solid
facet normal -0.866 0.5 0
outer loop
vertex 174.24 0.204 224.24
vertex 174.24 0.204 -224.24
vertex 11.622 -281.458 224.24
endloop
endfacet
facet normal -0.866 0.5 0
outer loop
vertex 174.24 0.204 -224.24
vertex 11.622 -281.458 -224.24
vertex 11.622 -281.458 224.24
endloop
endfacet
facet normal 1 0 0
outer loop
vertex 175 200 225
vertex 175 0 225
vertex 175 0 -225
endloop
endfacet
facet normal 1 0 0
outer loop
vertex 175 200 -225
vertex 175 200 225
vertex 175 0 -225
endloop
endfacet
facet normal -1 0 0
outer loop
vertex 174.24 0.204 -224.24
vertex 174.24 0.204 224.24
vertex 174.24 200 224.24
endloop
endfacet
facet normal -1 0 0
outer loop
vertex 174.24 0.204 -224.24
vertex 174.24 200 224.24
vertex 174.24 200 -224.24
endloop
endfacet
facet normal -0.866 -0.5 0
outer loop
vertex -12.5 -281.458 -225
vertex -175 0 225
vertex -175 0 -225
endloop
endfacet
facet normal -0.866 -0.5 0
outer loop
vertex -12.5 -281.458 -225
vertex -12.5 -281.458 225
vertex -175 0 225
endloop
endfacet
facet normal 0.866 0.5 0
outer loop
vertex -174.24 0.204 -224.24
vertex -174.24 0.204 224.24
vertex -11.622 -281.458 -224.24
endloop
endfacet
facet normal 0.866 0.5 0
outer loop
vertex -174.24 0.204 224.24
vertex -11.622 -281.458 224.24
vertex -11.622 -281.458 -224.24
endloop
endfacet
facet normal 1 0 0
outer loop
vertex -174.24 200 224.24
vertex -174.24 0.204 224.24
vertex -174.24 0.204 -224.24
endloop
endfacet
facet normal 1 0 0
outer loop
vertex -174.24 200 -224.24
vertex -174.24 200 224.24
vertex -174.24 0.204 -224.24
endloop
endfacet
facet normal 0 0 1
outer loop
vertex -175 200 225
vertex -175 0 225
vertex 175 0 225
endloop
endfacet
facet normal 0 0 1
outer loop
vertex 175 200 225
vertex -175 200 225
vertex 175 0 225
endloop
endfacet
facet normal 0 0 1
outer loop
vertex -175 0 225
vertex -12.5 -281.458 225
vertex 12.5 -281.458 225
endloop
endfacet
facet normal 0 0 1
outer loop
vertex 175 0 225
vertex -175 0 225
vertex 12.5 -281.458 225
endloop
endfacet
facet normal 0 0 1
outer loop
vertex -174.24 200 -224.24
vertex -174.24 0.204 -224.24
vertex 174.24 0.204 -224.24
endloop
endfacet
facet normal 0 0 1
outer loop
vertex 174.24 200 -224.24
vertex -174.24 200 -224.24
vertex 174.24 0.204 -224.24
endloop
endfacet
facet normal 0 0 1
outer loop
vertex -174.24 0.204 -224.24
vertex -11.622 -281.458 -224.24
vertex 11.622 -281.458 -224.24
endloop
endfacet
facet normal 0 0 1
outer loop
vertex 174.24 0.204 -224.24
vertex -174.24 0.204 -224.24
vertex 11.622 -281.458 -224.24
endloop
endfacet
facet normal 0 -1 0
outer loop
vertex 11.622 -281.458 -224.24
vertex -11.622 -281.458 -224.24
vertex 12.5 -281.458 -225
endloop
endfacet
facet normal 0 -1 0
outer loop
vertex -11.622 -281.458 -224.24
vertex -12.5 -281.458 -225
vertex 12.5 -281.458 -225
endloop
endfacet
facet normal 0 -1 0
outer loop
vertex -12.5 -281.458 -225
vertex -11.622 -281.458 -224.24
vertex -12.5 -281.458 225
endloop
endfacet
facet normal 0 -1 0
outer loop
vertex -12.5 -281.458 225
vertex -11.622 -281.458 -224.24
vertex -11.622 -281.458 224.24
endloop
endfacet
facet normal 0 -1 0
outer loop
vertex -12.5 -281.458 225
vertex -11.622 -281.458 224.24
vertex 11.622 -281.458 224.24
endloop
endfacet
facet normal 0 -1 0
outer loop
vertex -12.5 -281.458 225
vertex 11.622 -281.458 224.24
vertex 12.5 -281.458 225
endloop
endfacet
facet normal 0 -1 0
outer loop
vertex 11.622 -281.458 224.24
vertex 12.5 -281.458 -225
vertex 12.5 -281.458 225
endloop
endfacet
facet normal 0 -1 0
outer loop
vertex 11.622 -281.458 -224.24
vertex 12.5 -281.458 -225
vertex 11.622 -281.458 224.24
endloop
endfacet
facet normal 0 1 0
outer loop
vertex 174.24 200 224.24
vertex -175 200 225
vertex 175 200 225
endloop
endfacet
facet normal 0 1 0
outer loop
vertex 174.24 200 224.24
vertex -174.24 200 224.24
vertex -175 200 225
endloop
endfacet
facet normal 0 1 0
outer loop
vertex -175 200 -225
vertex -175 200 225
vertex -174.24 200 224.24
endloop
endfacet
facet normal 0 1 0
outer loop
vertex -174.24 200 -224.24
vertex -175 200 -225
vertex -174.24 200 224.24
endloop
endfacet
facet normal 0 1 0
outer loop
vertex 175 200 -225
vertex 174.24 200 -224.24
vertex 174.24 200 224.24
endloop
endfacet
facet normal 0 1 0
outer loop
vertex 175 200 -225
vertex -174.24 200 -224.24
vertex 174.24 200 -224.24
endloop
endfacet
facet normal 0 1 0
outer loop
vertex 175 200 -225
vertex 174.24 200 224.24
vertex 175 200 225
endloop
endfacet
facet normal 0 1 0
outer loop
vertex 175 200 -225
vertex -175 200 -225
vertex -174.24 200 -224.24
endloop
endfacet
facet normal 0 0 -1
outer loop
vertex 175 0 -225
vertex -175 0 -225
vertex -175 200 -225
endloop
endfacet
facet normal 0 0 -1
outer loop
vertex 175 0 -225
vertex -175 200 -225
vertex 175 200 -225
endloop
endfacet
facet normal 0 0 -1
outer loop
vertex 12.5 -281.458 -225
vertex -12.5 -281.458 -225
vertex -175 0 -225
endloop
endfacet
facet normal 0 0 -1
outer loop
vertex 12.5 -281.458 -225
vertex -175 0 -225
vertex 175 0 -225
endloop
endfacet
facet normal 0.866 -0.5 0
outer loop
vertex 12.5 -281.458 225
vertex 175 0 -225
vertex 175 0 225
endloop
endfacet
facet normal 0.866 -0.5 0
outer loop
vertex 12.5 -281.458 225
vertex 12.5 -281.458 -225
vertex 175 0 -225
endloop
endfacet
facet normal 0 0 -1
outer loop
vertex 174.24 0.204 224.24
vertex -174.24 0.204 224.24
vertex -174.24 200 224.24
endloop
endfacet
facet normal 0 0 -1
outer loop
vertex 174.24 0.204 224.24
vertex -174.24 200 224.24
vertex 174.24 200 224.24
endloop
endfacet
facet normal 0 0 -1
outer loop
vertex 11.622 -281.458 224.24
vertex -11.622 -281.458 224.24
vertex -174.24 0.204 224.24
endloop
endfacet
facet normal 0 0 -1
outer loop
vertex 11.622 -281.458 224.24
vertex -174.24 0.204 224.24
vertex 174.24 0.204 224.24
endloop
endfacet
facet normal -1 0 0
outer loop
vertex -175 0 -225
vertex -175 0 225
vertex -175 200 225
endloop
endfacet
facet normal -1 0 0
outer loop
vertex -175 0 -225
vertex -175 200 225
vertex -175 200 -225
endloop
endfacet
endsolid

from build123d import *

# Parameters (mm, degrees)
CROQUIS3_W              = 350
CROQUIS3_H              = 450
SALIENTE_EXTRUIR1_DEPTH = 200
VACIADO2_T              = -0.76


with BuildPart() as part:
    # Croquis1 → Recubrir1 section 0
    with BuildSketch(Plane(origin=(0, 0, 0), x_dir=(1, 0, 0), z_dir=(0, 1, 0))):
        with BuildLine():
            Line((-175, 225), (175, 225))
            Line((175, 225), (175, -225))
            Line((175, -225), (-175, -225))
            Line((-175, -225), (-175, 225))
        make_face()
    # Croquis2 → Recubrir1 section 1
    with BuildSketch(Plane(origin=(0, -281.458, 0), x_dir=(1, 0, 0), z_dir=(0, 1, 0))):
        with BuildLine():
            Line((-12.5, 225), (12.5, 225))
            Line((12.5, 225), (12.5, -225))
            Line((12.5, -225), (-12.5, -225))
            Line((-12.5, -225), (-12.5, 225))
        make_face()
    loft()

    # Croquis3 → Saliente-Extruir1 (add)
    with BuildSketch(Plane(origin=(0, 0, 0), x_dir=(1, 0, 0), z_dir=(0, 1, 0))):
        Rectangle(CROQUIS3_W, CROQUIS3_H)
    extrude(amount=SALIENTE_EXTRUIR1_DEPTH)

    # Vaciado2
    vaciado2_openings = [part.faces().sort_by_distance(p)[0] for p in [
        (0, -281.458, 0),
        (0, 200, 0),
    ]]
    offset(amount=VACIADO2_T, openings=vaciado2_openings, kind=Kind.INTERSECTION)


solid = part.part
